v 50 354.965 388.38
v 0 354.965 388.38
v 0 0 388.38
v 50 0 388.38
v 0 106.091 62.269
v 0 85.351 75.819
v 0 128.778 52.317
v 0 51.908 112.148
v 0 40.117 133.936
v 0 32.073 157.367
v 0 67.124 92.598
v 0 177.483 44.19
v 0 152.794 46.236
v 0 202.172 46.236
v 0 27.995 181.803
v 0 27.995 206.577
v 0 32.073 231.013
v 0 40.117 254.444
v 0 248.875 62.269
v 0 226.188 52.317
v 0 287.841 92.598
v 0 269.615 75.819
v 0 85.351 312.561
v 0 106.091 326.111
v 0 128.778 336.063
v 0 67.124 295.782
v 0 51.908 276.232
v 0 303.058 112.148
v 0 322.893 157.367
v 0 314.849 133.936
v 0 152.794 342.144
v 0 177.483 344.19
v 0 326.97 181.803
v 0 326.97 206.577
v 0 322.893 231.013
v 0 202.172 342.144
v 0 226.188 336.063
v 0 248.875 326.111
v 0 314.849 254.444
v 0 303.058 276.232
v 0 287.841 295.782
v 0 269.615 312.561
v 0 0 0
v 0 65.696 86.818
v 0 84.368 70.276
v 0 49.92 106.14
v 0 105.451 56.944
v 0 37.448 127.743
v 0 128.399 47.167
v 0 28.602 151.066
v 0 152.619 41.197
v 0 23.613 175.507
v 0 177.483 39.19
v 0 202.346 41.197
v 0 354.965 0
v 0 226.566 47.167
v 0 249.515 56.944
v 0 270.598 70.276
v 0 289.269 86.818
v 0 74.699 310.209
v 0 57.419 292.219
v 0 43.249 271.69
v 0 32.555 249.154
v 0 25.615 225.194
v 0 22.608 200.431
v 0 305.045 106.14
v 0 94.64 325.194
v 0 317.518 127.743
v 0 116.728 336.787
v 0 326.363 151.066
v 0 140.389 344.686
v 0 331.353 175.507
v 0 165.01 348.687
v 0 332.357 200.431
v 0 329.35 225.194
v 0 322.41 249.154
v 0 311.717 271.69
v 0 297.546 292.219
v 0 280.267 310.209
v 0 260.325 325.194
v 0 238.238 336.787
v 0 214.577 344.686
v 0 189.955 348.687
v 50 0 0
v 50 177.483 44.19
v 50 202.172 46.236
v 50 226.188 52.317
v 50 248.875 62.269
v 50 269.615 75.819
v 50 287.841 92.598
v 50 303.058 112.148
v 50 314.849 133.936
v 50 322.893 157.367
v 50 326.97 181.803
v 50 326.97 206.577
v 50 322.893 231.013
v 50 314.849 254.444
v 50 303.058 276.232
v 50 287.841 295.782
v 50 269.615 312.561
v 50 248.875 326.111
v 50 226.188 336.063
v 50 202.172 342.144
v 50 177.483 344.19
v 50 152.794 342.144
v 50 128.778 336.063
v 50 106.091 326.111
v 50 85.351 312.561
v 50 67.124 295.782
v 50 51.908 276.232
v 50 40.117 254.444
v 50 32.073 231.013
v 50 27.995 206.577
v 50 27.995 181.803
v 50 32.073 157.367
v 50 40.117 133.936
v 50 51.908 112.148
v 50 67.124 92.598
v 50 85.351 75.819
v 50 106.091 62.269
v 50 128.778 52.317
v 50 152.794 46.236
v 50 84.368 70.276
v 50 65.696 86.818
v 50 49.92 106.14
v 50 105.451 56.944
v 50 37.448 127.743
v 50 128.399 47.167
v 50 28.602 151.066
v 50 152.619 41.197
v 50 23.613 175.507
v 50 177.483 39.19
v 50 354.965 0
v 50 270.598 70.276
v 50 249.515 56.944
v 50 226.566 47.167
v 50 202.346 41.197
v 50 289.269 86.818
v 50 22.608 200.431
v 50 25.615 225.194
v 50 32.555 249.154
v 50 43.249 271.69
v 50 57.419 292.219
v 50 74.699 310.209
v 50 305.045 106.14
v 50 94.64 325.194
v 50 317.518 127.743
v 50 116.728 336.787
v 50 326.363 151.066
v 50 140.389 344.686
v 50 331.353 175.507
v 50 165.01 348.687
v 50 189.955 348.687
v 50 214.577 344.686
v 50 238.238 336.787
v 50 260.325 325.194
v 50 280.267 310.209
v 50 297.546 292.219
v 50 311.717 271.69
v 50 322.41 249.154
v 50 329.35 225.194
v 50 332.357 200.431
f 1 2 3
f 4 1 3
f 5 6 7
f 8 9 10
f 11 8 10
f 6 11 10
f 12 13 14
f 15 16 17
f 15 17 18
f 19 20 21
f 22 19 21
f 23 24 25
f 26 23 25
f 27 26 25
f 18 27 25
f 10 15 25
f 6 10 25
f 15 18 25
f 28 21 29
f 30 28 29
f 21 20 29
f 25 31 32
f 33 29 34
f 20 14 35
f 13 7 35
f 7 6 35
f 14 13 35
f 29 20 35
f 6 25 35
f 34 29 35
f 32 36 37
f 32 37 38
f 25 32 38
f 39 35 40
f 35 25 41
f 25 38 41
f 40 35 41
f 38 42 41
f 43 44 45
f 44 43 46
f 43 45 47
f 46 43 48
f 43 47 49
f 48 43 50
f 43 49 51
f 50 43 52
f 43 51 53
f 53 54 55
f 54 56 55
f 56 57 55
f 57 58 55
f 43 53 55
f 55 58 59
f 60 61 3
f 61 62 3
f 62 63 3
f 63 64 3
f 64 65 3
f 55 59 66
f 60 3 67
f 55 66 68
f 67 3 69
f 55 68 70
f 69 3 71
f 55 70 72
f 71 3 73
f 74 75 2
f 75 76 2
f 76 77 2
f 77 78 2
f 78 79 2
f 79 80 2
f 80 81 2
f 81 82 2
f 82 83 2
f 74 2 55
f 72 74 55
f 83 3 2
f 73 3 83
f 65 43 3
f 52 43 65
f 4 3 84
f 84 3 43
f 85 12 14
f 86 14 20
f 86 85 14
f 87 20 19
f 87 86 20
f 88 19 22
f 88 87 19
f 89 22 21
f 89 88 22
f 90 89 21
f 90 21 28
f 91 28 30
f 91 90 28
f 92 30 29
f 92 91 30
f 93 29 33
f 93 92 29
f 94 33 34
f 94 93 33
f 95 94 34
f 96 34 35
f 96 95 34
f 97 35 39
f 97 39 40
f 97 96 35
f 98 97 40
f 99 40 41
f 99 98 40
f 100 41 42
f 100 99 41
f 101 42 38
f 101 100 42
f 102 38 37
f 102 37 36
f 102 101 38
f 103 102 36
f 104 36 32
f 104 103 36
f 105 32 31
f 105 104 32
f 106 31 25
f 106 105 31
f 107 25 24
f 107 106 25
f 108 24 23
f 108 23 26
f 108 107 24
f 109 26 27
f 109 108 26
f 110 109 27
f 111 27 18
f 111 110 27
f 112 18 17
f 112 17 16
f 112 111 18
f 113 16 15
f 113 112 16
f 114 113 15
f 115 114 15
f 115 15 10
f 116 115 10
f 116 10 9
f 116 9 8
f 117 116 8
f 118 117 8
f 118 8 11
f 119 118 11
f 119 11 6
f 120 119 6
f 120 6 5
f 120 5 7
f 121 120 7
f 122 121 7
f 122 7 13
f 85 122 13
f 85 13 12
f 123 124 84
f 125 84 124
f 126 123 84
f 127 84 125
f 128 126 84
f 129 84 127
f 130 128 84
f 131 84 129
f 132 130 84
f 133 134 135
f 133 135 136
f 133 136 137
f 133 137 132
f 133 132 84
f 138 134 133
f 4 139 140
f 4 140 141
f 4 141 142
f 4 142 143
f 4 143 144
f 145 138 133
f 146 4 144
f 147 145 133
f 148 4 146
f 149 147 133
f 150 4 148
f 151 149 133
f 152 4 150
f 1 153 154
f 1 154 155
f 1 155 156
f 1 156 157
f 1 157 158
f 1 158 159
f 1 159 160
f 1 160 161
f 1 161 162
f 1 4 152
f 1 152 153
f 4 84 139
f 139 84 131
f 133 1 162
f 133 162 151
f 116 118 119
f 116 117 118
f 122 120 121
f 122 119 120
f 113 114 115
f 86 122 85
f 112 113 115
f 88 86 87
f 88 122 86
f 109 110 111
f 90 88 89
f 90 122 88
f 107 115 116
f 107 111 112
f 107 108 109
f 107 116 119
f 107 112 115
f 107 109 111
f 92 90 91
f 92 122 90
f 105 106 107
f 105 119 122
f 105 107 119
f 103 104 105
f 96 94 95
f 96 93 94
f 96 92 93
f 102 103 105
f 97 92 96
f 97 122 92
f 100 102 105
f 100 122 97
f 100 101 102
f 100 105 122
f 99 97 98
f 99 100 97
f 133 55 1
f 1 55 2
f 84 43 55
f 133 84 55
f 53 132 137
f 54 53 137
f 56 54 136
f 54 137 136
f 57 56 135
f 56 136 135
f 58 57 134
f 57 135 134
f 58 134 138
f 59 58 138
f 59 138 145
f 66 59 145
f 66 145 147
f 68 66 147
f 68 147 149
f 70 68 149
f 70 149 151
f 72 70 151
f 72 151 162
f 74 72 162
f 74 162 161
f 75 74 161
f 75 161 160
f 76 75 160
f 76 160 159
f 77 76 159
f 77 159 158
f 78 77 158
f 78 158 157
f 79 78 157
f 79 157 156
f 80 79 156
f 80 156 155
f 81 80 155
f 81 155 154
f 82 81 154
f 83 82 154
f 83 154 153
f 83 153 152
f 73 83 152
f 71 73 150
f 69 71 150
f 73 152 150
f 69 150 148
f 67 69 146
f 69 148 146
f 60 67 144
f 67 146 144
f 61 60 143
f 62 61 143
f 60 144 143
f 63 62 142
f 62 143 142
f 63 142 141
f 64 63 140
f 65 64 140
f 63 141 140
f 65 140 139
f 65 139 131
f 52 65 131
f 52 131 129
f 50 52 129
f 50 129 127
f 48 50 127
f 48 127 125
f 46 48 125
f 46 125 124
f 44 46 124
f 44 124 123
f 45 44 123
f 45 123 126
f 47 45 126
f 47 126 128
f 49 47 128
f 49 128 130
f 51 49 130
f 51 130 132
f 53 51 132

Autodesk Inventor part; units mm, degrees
ref_plane "YZ Plane" through (0, 0, 0) normal (1, 0, 0) x (0, 1, 0)
ref_plane "XZ Plane" through (0, 0, 0) normal (0, 1, 0) x (-1, 0, 0)
ref_plane "XY Plane" through (0, 0, 0) normal (0, 0, 1) x (1, 0, 0)
sketch "スケッチ1" plane through (0, 0, 0) normal (1, 0, 0) x (0, 1, 0)
  line L0 (0, 0) -> (354.9654, 0)
  line L1 (354.9654, 0) -> (354.9654, 388.3801)
  line L2 (354.9654, 388.3801) -> (0, 388.3801)
  line L3 (0, 388.3801) -> (0, 0)
extrude "押し出し1" add sketch "スケッチ1" along normal blind 50
sketch "スケッチ2" plane through (50, 0, 0) normal (1, 0, 0) x (0, 0, -1)
  line L0 (-388.3801, 354.9654) -> (-388.3801, 0) projected
  line L1 (-388.3801, 177.4827) -> (0, 177.4827)
  line L2 (0, 0) -> (0, 354.9654) projected
  line L3 (-388.3801, 0) -> (0, 0) projected
  line L4 (-194.19, 0) -> (-194.19, 354.9654)
  line L5 (0, 354.9654) -> (-388.3801, 354.9654) projected
  circle A0 centre (-194.19, 177.4827) radius 150
  circle A1 centre (-194.19, 177.4827) radius 155
  point P0 (-194.19, 177.4827)
  dimension "d2" = 300
  dimension "d3" = 5
extrude "押し出し2" cut sketch "スケッチ2" against normal through all contours A1 L4 A0 L1 | L1 A0 L4 A1 | A1 L1 A0 L4 | L4 A0 L1 A1
properties part number "radiator 2018"
